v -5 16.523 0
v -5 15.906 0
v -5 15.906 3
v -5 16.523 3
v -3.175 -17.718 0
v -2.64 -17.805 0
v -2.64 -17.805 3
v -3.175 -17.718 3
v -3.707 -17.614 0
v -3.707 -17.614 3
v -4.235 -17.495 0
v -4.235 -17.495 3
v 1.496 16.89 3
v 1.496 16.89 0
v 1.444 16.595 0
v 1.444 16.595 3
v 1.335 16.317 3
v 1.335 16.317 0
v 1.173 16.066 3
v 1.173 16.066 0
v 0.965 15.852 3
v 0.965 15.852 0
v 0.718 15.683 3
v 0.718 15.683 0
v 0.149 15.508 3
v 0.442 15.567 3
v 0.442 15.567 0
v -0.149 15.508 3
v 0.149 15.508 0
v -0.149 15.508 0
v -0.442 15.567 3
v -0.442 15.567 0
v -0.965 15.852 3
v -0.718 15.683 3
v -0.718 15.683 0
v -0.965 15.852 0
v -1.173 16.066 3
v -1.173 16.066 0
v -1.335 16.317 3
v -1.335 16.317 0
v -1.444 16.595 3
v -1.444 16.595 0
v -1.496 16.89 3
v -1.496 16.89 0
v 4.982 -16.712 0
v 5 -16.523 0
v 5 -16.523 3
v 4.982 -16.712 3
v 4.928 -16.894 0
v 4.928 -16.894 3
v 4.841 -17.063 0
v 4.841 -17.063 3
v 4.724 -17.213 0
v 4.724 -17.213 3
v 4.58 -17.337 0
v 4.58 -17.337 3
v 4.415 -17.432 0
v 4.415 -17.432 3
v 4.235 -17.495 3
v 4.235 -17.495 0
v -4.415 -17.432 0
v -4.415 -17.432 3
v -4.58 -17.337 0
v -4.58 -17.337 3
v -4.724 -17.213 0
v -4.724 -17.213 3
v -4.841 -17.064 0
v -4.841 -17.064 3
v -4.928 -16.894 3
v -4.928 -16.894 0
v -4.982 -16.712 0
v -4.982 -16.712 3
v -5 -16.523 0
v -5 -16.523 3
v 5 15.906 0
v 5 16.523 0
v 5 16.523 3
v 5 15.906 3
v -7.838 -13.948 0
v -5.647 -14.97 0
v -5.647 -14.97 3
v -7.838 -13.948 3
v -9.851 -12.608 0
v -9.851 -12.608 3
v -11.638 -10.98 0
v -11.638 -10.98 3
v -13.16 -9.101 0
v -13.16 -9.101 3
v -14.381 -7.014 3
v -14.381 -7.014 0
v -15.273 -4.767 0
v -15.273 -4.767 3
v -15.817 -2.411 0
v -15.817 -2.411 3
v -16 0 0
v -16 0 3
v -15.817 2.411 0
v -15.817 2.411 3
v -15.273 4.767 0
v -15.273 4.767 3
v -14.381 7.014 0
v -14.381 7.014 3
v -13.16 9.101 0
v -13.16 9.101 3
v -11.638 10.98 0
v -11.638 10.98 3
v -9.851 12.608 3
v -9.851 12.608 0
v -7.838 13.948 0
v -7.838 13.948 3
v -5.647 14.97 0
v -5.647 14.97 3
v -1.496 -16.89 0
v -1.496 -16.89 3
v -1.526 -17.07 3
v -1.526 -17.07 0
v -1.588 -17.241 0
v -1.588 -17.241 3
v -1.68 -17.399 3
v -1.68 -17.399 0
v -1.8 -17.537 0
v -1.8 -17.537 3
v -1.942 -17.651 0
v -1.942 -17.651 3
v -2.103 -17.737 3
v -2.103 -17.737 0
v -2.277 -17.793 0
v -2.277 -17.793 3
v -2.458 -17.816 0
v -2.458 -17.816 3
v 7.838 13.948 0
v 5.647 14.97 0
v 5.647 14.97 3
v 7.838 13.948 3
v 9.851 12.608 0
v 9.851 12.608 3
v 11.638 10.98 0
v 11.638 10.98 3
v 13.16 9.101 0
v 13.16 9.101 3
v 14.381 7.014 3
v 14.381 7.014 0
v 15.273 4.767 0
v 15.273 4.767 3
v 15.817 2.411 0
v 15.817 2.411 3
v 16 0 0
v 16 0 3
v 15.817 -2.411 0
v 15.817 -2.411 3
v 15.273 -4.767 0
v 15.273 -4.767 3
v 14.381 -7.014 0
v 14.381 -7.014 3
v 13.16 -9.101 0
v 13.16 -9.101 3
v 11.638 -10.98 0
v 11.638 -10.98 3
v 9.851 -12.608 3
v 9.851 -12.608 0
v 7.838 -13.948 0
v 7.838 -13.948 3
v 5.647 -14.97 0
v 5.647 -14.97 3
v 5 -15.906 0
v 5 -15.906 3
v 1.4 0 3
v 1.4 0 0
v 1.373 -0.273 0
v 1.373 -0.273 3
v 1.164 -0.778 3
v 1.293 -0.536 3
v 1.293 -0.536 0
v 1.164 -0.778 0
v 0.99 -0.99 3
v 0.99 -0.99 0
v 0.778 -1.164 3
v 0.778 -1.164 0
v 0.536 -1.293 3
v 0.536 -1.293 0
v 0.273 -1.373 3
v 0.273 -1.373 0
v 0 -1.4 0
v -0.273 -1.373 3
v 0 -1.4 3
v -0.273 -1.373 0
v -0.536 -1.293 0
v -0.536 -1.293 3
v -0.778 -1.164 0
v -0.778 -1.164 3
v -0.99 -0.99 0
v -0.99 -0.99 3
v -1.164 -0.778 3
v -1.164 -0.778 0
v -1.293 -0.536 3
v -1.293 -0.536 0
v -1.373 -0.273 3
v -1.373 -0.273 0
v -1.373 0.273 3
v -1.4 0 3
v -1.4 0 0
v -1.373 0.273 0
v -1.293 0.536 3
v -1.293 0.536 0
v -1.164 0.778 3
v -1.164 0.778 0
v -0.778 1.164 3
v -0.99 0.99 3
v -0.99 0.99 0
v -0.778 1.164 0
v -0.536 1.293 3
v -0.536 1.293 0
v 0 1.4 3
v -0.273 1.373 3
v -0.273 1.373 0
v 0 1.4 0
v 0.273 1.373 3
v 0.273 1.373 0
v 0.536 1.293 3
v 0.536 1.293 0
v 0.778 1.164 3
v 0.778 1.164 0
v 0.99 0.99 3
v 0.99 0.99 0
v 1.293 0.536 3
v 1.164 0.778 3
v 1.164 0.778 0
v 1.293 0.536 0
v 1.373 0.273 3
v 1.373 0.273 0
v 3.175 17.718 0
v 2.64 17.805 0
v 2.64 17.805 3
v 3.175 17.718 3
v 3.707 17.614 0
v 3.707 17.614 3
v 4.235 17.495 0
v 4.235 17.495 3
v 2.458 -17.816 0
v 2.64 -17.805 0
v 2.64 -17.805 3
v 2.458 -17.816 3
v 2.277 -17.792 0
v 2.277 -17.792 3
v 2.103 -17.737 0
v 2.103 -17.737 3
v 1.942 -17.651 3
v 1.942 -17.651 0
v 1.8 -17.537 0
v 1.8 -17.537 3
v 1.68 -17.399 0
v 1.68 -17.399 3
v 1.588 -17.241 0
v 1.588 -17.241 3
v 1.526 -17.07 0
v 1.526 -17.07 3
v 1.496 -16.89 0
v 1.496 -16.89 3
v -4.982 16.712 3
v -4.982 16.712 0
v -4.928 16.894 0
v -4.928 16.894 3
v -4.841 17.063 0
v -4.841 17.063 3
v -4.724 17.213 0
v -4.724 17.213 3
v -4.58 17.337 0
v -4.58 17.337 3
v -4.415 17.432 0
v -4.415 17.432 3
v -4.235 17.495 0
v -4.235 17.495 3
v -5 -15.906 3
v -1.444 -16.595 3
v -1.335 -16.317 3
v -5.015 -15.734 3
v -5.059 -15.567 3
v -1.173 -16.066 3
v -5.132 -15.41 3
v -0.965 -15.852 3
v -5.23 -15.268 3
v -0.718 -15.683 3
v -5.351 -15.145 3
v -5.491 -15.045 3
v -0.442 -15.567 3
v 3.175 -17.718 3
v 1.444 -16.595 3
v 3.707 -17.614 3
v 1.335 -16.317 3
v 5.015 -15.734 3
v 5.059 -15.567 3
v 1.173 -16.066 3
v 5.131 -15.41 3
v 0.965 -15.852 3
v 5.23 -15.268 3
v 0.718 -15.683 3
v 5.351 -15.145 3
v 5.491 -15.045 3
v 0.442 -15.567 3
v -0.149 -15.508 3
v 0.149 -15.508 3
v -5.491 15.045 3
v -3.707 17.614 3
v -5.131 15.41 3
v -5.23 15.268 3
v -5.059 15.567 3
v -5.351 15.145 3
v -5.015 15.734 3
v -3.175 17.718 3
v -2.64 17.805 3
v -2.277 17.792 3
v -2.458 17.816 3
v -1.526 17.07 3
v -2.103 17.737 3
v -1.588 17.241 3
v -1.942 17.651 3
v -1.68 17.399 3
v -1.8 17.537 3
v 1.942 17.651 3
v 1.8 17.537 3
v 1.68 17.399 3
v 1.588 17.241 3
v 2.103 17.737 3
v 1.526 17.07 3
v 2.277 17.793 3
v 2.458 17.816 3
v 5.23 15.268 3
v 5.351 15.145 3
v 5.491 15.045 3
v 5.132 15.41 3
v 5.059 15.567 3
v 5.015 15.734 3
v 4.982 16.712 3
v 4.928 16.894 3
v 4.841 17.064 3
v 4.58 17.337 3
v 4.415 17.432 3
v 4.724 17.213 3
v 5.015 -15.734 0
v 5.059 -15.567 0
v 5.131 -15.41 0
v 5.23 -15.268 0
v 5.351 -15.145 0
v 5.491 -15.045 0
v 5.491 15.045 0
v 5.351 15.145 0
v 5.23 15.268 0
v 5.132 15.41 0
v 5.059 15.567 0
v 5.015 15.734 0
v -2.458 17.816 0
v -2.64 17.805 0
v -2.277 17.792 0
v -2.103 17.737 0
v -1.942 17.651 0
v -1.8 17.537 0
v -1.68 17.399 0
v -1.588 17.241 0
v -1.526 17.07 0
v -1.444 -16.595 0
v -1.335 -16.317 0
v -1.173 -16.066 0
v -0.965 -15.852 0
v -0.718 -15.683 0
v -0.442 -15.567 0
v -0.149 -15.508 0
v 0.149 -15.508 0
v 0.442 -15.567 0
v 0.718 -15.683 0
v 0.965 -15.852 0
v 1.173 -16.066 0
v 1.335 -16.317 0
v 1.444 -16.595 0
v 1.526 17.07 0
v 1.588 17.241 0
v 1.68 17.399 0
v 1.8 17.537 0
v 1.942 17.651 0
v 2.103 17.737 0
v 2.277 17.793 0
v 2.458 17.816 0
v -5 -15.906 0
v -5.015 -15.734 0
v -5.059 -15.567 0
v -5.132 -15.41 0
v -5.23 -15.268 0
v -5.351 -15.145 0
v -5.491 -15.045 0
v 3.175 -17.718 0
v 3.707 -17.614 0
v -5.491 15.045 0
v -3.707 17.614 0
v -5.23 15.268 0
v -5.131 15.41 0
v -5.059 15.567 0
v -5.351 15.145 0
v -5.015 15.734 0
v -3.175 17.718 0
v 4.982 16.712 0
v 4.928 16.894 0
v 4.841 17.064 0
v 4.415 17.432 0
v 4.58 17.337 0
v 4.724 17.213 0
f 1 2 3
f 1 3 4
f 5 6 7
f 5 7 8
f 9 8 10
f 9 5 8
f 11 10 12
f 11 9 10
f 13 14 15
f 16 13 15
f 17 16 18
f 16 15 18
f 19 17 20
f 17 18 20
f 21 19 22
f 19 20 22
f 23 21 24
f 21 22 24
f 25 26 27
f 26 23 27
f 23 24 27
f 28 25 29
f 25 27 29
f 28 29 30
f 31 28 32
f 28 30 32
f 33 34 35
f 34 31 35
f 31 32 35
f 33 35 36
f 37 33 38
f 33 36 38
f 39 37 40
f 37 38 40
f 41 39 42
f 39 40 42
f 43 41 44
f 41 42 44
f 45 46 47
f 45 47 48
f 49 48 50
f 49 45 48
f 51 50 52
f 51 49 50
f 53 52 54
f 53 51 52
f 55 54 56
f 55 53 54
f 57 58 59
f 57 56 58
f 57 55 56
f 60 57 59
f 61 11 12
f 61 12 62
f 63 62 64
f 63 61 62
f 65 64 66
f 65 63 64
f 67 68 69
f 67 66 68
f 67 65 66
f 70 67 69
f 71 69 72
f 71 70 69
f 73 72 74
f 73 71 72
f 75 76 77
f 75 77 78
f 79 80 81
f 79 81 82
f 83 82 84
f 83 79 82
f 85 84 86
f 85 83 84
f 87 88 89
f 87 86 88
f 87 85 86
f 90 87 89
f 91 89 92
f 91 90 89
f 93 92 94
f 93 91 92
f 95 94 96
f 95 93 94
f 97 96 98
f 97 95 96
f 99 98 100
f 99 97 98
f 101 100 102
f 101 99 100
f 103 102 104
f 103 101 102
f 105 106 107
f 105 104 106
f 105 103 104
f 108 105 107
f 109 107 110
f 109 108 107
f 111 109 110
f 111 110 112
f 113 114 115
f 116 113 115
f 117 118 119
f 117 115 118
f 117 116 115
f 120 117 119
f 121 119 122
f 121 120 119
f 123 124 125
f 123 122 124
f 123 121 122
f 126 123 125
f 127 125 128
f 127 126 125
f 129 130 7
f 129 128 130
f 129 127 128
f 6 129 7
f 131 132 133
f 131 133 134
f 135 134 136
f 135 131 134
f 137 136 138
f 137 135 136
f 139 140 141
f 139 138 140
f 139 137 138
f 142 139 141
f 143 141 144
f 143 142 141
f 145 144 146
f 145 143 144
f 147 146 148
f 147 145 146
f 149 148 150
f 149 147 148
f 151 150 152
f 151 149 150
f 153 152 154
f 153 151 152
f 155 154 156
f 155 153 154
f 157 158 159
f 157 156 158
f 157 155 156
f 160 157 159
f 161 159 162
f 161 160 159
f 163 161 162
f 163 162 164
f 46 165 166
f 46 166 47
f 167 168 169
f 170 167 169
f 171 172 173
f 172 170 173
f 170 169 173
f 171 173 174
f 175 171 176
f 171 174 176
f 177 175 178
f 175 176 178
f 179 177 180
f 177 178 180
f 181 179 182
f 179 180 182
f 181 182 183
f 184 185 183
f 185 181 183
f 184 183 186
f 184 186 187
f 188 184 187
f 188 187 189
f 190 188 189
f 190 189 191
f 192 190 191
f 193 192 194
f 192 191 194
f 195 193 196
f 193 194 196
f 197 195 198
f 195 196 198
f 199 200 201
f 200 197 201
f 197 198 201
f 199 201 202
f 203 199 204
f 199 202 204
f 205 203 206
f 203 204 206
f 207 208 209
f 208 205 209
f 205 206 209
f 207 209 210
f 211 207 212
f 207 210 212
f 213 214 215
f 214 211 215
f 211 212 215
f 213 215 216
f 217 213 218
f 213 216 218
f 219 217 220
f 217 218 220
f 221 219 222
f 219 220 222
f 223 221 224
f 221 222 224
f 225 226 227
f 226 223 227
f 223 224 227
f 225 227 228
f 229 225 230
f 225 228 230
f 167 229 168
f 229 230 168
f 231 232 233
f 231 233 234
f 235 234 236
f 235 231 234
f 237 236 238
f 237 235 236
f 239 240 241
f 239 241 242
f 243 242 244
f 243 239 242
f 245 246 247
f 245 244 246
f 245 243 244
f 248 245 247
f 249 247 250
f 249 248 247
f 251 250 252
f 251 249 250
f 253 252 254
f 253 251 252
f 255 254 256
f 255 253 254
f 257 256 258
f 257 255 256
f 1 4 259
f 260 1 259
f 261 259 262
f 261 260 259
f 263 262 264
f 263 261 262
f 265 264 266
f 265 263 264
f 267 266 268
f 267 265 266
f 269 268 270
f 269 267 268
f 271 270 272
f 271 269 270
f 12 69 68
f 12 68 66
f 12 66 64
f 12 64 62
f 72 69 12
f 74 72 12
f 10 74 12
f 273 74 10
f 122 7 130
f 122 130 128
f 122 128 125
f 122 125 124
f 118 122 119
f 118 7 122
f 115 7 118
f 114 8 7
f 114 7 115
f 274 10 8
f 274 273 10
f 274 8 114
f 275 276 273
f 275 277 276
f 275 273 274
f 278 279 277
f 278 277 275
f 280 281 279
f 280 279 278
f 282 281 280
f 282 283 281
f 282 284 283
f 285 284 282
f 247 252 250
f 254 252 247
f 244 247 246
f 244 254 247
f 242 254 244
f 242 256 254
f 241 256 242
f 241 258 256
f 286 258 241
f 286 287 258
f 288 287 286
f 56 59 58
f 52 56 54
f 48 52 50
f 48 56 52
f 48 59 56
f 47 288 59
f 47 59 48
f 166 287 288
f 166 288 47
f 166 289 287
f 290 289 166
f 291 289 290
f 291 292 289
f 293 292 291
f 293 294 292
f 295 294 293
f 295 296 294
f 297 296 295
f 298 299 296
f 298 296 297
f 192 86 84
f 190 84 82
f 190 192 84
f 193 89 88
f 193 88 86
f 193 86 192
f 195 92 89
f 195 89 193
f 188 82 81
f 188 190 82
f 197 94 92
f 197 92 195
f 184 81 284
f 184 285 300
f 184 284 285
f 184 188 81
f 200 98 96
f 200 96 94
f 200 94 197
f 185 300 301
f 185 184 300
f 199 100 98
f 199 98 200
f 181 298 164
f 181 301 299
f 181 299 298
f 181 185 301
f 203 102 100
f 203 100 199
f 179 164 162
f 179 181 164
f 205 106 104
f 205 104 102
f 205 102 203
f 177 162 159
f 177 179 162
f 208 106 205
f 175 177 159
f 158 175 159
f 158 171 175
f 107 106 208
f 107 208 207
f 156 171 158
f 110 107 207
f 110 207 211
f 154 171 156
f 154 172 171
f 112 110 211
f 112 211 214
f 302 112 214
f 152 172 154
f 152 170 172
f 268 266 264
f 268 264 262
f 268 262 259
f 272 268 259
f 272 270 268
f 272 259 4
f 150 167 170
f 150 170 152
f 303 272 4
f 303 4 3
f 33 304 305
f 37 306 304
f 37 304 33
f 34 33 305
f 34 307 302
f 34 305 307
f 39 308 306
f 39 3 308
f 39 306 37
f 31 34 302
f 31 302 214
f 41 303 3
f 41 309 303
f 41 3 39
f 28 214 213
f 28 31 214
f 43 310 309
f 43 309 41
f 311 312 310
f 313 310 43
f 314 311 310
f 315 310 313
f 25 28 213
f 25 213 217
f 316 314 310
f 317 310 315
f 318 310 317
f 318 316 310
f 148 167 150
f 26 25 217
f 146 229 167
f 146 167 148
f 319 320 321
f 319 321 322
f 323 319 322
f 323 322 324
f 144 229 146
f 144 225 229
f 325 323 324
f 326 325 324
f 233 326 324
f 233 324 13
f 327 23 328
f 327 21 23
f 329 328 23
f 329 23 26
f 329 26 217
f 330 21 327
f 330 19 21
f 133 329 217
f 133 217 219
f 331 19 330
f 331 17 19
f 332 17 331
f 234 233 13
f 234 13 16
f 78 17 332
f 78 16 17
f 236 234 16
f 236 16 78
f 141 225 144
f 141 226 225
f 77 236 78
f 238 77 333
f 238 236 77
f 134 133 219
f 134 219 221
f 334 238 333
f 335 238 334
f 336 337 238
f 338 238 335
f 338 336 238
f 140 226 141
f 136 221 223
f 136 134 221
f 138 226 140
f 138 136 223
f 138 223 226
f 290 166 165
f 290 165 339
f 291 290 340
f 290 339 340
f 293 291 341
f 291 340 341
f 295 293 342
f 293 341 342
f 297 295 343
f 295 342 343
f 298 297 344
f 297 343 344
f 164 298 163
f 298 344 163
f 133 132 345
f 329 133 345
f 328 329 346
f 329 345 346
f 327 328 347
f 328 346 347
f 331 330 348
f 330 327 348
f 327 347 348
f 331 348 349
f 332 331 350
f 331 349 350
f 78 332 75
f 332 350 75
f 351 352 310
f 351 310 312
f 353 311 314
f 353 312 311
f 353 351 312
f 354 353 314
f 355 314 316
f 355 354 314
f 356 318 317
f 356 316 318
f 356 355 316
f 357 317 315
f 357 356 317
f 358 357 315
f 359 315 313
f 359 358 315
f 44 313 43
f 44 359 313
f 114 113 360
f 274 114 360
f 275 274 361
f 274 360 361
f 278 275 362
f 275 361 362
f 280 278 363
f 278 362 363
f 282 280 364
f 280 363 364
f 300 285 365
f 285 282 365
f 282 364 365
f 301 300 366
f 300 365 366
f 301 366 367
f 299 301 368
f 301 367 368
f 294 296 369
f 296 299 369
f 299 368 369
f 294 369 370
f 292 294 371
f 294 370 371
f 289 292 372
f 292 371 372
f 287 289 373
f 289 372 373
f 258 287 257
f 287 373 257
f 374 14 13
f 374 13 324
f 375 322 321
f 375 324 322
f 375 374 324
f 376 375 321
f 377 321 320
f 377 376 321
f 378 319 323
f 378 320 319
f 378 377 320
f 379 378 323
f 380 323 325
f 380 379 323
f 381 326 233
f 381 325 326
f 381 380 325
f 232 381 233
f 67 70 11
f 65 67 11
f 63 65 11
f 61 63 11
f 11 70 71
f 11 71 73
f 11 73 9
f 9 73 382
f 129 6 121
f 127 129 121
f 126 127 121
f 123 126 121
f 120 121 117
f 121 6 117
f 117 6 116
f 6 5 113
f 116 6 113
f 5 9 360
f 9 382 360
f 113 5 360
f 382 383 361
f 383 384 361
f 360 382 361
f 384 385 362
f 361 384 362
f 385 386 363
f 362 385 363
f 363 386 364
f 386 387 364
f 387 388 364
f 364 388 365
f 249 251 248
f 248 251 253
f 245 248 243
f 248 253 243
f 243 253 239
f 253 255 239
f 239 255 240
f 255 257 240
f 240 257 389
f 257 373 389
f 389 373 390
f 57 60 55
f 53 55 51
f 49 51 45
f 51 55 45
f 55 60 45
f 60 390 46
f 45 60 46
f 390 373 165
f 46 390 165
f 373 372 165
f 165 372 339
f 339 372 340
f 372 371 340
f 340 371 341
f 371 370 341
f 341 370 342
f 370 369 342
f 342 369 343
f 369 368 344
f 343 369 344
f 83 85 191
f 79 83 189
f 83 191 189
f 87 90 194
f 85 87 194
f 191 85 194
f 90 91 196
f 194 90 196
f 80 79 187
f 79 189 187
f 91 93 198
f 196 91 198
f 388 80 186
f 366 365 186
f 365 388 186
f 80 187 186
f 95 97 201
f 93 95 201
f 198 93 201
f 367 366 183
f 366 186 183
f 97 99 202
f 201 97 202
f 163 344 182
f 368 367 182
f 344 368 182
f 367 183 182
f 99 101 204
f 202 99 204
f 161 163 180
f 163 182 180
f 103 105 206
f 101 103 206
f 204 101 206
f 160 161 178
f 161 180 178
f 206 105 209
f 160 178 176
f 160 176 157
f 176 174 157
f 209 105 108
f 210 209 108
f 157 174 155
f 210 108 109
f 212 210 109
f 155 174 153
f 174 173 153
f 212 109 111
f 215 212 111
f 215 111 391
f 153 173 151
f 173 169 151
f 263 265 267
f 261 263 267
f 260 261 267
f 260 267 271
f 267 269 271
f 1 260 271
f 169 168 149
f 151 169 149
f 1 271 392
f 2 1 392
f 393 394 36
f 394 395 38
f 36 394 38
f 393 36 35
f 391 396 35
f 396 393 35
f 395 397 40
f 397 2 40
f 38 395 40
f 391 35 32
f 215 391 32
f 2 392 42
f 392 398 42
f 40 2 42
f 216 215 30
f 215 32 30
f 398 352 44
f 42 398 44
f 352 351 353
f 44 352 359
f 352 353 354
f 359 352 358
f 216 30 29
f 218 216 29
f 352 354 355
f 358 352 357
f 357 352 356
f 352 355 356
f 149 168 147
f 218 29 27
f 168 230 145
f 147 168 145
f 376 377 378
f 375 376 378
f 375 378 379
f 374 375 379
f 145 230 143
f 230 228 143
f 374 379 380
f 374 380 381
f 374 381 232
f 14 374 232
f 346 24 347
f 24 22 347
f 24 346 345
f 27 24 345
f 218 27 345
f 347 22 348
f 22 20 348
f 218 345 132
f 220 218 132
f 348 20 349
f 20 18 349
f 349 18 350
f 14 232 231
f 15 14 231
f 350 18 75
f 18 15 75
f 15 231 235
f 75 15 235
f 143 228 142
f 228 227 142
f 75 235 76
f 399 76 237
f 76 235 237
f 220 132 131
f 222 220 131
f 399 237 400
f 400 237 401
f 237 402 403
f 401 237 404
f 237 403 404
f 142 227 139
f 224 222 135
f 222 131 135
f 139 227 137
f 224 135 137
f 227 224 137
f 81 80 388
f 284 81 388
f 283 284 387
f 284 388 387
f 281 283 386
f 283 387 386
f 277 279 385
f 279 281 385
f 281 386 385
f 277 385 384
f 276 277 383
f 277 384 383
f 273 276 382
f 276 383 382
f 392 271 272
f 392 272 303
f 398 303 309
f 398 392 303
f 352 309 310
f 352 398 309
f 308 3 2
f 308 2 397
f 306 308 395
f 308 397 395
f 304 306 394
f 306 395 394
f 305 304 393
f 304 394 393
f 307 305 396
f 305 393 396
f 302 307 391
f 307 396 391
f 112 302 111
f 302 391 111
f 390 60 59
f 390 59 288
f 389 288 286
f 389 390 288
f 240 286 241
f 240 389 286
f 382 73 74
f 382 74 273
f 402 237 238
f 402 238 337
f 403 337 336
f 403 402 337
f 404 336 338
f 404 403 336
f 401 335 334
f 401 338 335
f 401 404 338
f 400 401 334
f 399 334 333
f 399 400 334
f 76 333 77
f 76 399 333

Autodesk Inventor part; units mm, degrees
ref_plane "YZ Plane" through (0, 0, 0) normal (1, 0, 0) x (0, 1, 0)
ref_plane "XZ Plane" through (0, 0, 0) normal (0, 1, 0) x (-1, 0, 0)
ref_plane "XY Plane" through (0, 0, 0) normal (0, 0, 1) x (1, 0, 0)
sketch "Sketch1" plane through (0, 0, 0) normal (0, 0, 1) x (1, 0, 0)
  circle A0 centre (0, 0) radius 1.4
  line L0 (5, 16.5227) -> (5, 15.906)
  line L1 (5, -15.906) -> (5, -16.5227)
  line L2 (-5, -16.5227) -> (-5, -15.906)
  line L3 (-5, 15.906) -> (-5, 16.5227)
  arc A1 (-5.6471, 14.9703) -> (-5.6471, -14.9703) centre (0, 0) ccw
  arc A2 (5.6471, -14.9703) -> (5.6471, 14.9703) centre (0, 0) ccw
  arc A3 (-5.6471, 14.9703) -> (-5, 15.906) centre (-6, 15.906) ccw
  arc A4 (-4.2353, 17.4946) -> (-5, 16.5227) centre (-4, 16.5227) ccw
  arc A5 (5, 16.5227) -> (4.2353, 17.4946) centre (4, 16.5227) ccw
  arc A6 (5, 15.906) -> (5.6471, 14.9703) centre (6, 15.906) ccw
  arc A7 (5.6471, -14.9703) -> (5, -15.906) centre (6, -15.906) ccw
  arc A8 (4.2353, -17.4946) -> (5, -16.5227) centre (4, -16.5227) ccw
  arc A9 (-5, -16.5227) -> (-4.2353, -17.4946) centre (-4, -16.5227) ccw
  arc A10 (-5, -15.906) -> (-5.6471, -14.9703) centre (-6, -15.906) ccw
  arc A11 (-1.4959, 16.8897) -> (1.4959, 16.8897) centre (0, 17) ccw
  arc A12 (1.4959, -16.8897) -> (-1.4959, -16.8897) centre (0, -17) ccw
  arc A13 (-4.2353, -17.4946) -> (-2.6399, -17.8054) centre (0, 0) ccw
  arc A14 (2.6399, -17.8054) -> (4.2353, -17.4946) centre (0, 0) ccw
  arc A15 (4.2353, 17.4946) -> (2.6399, 17.8054) centre (0, 0) ccw
  arc A16 (-2.6399, 17.8054) -> (-4.2353, 17.4946) centre (0, 0) ccw
  arc A17 (-1.4959, 16.8897) -> (-2.6399, 17.8054) centre (-2.4932, 16.8162) ccw
  arc A18 (2.6399, 17.8054) -> (1.4959, 16.8897) centre (2.4932, 16.8162) ccw
  arc A19 (-2.6399, -17.8054) -> (-1.4959, -16.8897) centre (-2.4932, -16.8162) ccw
  arc A20 (1.4959, -16.8897) -> (2.6399, -17.8054) centre (2.4932, -16.8162) ccw
  point P0 (5, -17.2916)
  point P1 (-5, -17.2916)
  point P2 (5, 15.1987)
  point P3 (5, -15.1987)
  point P4 (-5, -15.1987)
  point P5 (-5, 15.1987)
  point P6 (-5, 17.2916)
  point P7 (5, 17.2916)
  dimension "d3" = 2.8
  dimension "d9" = 1
  dimension "d12" = 16
  dimension "d13" = 16
  dimension "d14" = 10
  dimension "d15" = 10
  dimension "d16" = 5
  dimension "d17" = 5
  dimension "d18" = 3
  dimension "d19" = 17
  dimension "d20" = 3
  dimension "d21" = 17
  dimension "d22" = 1
extrude "Extrusion1" add sketch "Sketch1" along normal blind 3
properties part number "Front Outer Endcap"
